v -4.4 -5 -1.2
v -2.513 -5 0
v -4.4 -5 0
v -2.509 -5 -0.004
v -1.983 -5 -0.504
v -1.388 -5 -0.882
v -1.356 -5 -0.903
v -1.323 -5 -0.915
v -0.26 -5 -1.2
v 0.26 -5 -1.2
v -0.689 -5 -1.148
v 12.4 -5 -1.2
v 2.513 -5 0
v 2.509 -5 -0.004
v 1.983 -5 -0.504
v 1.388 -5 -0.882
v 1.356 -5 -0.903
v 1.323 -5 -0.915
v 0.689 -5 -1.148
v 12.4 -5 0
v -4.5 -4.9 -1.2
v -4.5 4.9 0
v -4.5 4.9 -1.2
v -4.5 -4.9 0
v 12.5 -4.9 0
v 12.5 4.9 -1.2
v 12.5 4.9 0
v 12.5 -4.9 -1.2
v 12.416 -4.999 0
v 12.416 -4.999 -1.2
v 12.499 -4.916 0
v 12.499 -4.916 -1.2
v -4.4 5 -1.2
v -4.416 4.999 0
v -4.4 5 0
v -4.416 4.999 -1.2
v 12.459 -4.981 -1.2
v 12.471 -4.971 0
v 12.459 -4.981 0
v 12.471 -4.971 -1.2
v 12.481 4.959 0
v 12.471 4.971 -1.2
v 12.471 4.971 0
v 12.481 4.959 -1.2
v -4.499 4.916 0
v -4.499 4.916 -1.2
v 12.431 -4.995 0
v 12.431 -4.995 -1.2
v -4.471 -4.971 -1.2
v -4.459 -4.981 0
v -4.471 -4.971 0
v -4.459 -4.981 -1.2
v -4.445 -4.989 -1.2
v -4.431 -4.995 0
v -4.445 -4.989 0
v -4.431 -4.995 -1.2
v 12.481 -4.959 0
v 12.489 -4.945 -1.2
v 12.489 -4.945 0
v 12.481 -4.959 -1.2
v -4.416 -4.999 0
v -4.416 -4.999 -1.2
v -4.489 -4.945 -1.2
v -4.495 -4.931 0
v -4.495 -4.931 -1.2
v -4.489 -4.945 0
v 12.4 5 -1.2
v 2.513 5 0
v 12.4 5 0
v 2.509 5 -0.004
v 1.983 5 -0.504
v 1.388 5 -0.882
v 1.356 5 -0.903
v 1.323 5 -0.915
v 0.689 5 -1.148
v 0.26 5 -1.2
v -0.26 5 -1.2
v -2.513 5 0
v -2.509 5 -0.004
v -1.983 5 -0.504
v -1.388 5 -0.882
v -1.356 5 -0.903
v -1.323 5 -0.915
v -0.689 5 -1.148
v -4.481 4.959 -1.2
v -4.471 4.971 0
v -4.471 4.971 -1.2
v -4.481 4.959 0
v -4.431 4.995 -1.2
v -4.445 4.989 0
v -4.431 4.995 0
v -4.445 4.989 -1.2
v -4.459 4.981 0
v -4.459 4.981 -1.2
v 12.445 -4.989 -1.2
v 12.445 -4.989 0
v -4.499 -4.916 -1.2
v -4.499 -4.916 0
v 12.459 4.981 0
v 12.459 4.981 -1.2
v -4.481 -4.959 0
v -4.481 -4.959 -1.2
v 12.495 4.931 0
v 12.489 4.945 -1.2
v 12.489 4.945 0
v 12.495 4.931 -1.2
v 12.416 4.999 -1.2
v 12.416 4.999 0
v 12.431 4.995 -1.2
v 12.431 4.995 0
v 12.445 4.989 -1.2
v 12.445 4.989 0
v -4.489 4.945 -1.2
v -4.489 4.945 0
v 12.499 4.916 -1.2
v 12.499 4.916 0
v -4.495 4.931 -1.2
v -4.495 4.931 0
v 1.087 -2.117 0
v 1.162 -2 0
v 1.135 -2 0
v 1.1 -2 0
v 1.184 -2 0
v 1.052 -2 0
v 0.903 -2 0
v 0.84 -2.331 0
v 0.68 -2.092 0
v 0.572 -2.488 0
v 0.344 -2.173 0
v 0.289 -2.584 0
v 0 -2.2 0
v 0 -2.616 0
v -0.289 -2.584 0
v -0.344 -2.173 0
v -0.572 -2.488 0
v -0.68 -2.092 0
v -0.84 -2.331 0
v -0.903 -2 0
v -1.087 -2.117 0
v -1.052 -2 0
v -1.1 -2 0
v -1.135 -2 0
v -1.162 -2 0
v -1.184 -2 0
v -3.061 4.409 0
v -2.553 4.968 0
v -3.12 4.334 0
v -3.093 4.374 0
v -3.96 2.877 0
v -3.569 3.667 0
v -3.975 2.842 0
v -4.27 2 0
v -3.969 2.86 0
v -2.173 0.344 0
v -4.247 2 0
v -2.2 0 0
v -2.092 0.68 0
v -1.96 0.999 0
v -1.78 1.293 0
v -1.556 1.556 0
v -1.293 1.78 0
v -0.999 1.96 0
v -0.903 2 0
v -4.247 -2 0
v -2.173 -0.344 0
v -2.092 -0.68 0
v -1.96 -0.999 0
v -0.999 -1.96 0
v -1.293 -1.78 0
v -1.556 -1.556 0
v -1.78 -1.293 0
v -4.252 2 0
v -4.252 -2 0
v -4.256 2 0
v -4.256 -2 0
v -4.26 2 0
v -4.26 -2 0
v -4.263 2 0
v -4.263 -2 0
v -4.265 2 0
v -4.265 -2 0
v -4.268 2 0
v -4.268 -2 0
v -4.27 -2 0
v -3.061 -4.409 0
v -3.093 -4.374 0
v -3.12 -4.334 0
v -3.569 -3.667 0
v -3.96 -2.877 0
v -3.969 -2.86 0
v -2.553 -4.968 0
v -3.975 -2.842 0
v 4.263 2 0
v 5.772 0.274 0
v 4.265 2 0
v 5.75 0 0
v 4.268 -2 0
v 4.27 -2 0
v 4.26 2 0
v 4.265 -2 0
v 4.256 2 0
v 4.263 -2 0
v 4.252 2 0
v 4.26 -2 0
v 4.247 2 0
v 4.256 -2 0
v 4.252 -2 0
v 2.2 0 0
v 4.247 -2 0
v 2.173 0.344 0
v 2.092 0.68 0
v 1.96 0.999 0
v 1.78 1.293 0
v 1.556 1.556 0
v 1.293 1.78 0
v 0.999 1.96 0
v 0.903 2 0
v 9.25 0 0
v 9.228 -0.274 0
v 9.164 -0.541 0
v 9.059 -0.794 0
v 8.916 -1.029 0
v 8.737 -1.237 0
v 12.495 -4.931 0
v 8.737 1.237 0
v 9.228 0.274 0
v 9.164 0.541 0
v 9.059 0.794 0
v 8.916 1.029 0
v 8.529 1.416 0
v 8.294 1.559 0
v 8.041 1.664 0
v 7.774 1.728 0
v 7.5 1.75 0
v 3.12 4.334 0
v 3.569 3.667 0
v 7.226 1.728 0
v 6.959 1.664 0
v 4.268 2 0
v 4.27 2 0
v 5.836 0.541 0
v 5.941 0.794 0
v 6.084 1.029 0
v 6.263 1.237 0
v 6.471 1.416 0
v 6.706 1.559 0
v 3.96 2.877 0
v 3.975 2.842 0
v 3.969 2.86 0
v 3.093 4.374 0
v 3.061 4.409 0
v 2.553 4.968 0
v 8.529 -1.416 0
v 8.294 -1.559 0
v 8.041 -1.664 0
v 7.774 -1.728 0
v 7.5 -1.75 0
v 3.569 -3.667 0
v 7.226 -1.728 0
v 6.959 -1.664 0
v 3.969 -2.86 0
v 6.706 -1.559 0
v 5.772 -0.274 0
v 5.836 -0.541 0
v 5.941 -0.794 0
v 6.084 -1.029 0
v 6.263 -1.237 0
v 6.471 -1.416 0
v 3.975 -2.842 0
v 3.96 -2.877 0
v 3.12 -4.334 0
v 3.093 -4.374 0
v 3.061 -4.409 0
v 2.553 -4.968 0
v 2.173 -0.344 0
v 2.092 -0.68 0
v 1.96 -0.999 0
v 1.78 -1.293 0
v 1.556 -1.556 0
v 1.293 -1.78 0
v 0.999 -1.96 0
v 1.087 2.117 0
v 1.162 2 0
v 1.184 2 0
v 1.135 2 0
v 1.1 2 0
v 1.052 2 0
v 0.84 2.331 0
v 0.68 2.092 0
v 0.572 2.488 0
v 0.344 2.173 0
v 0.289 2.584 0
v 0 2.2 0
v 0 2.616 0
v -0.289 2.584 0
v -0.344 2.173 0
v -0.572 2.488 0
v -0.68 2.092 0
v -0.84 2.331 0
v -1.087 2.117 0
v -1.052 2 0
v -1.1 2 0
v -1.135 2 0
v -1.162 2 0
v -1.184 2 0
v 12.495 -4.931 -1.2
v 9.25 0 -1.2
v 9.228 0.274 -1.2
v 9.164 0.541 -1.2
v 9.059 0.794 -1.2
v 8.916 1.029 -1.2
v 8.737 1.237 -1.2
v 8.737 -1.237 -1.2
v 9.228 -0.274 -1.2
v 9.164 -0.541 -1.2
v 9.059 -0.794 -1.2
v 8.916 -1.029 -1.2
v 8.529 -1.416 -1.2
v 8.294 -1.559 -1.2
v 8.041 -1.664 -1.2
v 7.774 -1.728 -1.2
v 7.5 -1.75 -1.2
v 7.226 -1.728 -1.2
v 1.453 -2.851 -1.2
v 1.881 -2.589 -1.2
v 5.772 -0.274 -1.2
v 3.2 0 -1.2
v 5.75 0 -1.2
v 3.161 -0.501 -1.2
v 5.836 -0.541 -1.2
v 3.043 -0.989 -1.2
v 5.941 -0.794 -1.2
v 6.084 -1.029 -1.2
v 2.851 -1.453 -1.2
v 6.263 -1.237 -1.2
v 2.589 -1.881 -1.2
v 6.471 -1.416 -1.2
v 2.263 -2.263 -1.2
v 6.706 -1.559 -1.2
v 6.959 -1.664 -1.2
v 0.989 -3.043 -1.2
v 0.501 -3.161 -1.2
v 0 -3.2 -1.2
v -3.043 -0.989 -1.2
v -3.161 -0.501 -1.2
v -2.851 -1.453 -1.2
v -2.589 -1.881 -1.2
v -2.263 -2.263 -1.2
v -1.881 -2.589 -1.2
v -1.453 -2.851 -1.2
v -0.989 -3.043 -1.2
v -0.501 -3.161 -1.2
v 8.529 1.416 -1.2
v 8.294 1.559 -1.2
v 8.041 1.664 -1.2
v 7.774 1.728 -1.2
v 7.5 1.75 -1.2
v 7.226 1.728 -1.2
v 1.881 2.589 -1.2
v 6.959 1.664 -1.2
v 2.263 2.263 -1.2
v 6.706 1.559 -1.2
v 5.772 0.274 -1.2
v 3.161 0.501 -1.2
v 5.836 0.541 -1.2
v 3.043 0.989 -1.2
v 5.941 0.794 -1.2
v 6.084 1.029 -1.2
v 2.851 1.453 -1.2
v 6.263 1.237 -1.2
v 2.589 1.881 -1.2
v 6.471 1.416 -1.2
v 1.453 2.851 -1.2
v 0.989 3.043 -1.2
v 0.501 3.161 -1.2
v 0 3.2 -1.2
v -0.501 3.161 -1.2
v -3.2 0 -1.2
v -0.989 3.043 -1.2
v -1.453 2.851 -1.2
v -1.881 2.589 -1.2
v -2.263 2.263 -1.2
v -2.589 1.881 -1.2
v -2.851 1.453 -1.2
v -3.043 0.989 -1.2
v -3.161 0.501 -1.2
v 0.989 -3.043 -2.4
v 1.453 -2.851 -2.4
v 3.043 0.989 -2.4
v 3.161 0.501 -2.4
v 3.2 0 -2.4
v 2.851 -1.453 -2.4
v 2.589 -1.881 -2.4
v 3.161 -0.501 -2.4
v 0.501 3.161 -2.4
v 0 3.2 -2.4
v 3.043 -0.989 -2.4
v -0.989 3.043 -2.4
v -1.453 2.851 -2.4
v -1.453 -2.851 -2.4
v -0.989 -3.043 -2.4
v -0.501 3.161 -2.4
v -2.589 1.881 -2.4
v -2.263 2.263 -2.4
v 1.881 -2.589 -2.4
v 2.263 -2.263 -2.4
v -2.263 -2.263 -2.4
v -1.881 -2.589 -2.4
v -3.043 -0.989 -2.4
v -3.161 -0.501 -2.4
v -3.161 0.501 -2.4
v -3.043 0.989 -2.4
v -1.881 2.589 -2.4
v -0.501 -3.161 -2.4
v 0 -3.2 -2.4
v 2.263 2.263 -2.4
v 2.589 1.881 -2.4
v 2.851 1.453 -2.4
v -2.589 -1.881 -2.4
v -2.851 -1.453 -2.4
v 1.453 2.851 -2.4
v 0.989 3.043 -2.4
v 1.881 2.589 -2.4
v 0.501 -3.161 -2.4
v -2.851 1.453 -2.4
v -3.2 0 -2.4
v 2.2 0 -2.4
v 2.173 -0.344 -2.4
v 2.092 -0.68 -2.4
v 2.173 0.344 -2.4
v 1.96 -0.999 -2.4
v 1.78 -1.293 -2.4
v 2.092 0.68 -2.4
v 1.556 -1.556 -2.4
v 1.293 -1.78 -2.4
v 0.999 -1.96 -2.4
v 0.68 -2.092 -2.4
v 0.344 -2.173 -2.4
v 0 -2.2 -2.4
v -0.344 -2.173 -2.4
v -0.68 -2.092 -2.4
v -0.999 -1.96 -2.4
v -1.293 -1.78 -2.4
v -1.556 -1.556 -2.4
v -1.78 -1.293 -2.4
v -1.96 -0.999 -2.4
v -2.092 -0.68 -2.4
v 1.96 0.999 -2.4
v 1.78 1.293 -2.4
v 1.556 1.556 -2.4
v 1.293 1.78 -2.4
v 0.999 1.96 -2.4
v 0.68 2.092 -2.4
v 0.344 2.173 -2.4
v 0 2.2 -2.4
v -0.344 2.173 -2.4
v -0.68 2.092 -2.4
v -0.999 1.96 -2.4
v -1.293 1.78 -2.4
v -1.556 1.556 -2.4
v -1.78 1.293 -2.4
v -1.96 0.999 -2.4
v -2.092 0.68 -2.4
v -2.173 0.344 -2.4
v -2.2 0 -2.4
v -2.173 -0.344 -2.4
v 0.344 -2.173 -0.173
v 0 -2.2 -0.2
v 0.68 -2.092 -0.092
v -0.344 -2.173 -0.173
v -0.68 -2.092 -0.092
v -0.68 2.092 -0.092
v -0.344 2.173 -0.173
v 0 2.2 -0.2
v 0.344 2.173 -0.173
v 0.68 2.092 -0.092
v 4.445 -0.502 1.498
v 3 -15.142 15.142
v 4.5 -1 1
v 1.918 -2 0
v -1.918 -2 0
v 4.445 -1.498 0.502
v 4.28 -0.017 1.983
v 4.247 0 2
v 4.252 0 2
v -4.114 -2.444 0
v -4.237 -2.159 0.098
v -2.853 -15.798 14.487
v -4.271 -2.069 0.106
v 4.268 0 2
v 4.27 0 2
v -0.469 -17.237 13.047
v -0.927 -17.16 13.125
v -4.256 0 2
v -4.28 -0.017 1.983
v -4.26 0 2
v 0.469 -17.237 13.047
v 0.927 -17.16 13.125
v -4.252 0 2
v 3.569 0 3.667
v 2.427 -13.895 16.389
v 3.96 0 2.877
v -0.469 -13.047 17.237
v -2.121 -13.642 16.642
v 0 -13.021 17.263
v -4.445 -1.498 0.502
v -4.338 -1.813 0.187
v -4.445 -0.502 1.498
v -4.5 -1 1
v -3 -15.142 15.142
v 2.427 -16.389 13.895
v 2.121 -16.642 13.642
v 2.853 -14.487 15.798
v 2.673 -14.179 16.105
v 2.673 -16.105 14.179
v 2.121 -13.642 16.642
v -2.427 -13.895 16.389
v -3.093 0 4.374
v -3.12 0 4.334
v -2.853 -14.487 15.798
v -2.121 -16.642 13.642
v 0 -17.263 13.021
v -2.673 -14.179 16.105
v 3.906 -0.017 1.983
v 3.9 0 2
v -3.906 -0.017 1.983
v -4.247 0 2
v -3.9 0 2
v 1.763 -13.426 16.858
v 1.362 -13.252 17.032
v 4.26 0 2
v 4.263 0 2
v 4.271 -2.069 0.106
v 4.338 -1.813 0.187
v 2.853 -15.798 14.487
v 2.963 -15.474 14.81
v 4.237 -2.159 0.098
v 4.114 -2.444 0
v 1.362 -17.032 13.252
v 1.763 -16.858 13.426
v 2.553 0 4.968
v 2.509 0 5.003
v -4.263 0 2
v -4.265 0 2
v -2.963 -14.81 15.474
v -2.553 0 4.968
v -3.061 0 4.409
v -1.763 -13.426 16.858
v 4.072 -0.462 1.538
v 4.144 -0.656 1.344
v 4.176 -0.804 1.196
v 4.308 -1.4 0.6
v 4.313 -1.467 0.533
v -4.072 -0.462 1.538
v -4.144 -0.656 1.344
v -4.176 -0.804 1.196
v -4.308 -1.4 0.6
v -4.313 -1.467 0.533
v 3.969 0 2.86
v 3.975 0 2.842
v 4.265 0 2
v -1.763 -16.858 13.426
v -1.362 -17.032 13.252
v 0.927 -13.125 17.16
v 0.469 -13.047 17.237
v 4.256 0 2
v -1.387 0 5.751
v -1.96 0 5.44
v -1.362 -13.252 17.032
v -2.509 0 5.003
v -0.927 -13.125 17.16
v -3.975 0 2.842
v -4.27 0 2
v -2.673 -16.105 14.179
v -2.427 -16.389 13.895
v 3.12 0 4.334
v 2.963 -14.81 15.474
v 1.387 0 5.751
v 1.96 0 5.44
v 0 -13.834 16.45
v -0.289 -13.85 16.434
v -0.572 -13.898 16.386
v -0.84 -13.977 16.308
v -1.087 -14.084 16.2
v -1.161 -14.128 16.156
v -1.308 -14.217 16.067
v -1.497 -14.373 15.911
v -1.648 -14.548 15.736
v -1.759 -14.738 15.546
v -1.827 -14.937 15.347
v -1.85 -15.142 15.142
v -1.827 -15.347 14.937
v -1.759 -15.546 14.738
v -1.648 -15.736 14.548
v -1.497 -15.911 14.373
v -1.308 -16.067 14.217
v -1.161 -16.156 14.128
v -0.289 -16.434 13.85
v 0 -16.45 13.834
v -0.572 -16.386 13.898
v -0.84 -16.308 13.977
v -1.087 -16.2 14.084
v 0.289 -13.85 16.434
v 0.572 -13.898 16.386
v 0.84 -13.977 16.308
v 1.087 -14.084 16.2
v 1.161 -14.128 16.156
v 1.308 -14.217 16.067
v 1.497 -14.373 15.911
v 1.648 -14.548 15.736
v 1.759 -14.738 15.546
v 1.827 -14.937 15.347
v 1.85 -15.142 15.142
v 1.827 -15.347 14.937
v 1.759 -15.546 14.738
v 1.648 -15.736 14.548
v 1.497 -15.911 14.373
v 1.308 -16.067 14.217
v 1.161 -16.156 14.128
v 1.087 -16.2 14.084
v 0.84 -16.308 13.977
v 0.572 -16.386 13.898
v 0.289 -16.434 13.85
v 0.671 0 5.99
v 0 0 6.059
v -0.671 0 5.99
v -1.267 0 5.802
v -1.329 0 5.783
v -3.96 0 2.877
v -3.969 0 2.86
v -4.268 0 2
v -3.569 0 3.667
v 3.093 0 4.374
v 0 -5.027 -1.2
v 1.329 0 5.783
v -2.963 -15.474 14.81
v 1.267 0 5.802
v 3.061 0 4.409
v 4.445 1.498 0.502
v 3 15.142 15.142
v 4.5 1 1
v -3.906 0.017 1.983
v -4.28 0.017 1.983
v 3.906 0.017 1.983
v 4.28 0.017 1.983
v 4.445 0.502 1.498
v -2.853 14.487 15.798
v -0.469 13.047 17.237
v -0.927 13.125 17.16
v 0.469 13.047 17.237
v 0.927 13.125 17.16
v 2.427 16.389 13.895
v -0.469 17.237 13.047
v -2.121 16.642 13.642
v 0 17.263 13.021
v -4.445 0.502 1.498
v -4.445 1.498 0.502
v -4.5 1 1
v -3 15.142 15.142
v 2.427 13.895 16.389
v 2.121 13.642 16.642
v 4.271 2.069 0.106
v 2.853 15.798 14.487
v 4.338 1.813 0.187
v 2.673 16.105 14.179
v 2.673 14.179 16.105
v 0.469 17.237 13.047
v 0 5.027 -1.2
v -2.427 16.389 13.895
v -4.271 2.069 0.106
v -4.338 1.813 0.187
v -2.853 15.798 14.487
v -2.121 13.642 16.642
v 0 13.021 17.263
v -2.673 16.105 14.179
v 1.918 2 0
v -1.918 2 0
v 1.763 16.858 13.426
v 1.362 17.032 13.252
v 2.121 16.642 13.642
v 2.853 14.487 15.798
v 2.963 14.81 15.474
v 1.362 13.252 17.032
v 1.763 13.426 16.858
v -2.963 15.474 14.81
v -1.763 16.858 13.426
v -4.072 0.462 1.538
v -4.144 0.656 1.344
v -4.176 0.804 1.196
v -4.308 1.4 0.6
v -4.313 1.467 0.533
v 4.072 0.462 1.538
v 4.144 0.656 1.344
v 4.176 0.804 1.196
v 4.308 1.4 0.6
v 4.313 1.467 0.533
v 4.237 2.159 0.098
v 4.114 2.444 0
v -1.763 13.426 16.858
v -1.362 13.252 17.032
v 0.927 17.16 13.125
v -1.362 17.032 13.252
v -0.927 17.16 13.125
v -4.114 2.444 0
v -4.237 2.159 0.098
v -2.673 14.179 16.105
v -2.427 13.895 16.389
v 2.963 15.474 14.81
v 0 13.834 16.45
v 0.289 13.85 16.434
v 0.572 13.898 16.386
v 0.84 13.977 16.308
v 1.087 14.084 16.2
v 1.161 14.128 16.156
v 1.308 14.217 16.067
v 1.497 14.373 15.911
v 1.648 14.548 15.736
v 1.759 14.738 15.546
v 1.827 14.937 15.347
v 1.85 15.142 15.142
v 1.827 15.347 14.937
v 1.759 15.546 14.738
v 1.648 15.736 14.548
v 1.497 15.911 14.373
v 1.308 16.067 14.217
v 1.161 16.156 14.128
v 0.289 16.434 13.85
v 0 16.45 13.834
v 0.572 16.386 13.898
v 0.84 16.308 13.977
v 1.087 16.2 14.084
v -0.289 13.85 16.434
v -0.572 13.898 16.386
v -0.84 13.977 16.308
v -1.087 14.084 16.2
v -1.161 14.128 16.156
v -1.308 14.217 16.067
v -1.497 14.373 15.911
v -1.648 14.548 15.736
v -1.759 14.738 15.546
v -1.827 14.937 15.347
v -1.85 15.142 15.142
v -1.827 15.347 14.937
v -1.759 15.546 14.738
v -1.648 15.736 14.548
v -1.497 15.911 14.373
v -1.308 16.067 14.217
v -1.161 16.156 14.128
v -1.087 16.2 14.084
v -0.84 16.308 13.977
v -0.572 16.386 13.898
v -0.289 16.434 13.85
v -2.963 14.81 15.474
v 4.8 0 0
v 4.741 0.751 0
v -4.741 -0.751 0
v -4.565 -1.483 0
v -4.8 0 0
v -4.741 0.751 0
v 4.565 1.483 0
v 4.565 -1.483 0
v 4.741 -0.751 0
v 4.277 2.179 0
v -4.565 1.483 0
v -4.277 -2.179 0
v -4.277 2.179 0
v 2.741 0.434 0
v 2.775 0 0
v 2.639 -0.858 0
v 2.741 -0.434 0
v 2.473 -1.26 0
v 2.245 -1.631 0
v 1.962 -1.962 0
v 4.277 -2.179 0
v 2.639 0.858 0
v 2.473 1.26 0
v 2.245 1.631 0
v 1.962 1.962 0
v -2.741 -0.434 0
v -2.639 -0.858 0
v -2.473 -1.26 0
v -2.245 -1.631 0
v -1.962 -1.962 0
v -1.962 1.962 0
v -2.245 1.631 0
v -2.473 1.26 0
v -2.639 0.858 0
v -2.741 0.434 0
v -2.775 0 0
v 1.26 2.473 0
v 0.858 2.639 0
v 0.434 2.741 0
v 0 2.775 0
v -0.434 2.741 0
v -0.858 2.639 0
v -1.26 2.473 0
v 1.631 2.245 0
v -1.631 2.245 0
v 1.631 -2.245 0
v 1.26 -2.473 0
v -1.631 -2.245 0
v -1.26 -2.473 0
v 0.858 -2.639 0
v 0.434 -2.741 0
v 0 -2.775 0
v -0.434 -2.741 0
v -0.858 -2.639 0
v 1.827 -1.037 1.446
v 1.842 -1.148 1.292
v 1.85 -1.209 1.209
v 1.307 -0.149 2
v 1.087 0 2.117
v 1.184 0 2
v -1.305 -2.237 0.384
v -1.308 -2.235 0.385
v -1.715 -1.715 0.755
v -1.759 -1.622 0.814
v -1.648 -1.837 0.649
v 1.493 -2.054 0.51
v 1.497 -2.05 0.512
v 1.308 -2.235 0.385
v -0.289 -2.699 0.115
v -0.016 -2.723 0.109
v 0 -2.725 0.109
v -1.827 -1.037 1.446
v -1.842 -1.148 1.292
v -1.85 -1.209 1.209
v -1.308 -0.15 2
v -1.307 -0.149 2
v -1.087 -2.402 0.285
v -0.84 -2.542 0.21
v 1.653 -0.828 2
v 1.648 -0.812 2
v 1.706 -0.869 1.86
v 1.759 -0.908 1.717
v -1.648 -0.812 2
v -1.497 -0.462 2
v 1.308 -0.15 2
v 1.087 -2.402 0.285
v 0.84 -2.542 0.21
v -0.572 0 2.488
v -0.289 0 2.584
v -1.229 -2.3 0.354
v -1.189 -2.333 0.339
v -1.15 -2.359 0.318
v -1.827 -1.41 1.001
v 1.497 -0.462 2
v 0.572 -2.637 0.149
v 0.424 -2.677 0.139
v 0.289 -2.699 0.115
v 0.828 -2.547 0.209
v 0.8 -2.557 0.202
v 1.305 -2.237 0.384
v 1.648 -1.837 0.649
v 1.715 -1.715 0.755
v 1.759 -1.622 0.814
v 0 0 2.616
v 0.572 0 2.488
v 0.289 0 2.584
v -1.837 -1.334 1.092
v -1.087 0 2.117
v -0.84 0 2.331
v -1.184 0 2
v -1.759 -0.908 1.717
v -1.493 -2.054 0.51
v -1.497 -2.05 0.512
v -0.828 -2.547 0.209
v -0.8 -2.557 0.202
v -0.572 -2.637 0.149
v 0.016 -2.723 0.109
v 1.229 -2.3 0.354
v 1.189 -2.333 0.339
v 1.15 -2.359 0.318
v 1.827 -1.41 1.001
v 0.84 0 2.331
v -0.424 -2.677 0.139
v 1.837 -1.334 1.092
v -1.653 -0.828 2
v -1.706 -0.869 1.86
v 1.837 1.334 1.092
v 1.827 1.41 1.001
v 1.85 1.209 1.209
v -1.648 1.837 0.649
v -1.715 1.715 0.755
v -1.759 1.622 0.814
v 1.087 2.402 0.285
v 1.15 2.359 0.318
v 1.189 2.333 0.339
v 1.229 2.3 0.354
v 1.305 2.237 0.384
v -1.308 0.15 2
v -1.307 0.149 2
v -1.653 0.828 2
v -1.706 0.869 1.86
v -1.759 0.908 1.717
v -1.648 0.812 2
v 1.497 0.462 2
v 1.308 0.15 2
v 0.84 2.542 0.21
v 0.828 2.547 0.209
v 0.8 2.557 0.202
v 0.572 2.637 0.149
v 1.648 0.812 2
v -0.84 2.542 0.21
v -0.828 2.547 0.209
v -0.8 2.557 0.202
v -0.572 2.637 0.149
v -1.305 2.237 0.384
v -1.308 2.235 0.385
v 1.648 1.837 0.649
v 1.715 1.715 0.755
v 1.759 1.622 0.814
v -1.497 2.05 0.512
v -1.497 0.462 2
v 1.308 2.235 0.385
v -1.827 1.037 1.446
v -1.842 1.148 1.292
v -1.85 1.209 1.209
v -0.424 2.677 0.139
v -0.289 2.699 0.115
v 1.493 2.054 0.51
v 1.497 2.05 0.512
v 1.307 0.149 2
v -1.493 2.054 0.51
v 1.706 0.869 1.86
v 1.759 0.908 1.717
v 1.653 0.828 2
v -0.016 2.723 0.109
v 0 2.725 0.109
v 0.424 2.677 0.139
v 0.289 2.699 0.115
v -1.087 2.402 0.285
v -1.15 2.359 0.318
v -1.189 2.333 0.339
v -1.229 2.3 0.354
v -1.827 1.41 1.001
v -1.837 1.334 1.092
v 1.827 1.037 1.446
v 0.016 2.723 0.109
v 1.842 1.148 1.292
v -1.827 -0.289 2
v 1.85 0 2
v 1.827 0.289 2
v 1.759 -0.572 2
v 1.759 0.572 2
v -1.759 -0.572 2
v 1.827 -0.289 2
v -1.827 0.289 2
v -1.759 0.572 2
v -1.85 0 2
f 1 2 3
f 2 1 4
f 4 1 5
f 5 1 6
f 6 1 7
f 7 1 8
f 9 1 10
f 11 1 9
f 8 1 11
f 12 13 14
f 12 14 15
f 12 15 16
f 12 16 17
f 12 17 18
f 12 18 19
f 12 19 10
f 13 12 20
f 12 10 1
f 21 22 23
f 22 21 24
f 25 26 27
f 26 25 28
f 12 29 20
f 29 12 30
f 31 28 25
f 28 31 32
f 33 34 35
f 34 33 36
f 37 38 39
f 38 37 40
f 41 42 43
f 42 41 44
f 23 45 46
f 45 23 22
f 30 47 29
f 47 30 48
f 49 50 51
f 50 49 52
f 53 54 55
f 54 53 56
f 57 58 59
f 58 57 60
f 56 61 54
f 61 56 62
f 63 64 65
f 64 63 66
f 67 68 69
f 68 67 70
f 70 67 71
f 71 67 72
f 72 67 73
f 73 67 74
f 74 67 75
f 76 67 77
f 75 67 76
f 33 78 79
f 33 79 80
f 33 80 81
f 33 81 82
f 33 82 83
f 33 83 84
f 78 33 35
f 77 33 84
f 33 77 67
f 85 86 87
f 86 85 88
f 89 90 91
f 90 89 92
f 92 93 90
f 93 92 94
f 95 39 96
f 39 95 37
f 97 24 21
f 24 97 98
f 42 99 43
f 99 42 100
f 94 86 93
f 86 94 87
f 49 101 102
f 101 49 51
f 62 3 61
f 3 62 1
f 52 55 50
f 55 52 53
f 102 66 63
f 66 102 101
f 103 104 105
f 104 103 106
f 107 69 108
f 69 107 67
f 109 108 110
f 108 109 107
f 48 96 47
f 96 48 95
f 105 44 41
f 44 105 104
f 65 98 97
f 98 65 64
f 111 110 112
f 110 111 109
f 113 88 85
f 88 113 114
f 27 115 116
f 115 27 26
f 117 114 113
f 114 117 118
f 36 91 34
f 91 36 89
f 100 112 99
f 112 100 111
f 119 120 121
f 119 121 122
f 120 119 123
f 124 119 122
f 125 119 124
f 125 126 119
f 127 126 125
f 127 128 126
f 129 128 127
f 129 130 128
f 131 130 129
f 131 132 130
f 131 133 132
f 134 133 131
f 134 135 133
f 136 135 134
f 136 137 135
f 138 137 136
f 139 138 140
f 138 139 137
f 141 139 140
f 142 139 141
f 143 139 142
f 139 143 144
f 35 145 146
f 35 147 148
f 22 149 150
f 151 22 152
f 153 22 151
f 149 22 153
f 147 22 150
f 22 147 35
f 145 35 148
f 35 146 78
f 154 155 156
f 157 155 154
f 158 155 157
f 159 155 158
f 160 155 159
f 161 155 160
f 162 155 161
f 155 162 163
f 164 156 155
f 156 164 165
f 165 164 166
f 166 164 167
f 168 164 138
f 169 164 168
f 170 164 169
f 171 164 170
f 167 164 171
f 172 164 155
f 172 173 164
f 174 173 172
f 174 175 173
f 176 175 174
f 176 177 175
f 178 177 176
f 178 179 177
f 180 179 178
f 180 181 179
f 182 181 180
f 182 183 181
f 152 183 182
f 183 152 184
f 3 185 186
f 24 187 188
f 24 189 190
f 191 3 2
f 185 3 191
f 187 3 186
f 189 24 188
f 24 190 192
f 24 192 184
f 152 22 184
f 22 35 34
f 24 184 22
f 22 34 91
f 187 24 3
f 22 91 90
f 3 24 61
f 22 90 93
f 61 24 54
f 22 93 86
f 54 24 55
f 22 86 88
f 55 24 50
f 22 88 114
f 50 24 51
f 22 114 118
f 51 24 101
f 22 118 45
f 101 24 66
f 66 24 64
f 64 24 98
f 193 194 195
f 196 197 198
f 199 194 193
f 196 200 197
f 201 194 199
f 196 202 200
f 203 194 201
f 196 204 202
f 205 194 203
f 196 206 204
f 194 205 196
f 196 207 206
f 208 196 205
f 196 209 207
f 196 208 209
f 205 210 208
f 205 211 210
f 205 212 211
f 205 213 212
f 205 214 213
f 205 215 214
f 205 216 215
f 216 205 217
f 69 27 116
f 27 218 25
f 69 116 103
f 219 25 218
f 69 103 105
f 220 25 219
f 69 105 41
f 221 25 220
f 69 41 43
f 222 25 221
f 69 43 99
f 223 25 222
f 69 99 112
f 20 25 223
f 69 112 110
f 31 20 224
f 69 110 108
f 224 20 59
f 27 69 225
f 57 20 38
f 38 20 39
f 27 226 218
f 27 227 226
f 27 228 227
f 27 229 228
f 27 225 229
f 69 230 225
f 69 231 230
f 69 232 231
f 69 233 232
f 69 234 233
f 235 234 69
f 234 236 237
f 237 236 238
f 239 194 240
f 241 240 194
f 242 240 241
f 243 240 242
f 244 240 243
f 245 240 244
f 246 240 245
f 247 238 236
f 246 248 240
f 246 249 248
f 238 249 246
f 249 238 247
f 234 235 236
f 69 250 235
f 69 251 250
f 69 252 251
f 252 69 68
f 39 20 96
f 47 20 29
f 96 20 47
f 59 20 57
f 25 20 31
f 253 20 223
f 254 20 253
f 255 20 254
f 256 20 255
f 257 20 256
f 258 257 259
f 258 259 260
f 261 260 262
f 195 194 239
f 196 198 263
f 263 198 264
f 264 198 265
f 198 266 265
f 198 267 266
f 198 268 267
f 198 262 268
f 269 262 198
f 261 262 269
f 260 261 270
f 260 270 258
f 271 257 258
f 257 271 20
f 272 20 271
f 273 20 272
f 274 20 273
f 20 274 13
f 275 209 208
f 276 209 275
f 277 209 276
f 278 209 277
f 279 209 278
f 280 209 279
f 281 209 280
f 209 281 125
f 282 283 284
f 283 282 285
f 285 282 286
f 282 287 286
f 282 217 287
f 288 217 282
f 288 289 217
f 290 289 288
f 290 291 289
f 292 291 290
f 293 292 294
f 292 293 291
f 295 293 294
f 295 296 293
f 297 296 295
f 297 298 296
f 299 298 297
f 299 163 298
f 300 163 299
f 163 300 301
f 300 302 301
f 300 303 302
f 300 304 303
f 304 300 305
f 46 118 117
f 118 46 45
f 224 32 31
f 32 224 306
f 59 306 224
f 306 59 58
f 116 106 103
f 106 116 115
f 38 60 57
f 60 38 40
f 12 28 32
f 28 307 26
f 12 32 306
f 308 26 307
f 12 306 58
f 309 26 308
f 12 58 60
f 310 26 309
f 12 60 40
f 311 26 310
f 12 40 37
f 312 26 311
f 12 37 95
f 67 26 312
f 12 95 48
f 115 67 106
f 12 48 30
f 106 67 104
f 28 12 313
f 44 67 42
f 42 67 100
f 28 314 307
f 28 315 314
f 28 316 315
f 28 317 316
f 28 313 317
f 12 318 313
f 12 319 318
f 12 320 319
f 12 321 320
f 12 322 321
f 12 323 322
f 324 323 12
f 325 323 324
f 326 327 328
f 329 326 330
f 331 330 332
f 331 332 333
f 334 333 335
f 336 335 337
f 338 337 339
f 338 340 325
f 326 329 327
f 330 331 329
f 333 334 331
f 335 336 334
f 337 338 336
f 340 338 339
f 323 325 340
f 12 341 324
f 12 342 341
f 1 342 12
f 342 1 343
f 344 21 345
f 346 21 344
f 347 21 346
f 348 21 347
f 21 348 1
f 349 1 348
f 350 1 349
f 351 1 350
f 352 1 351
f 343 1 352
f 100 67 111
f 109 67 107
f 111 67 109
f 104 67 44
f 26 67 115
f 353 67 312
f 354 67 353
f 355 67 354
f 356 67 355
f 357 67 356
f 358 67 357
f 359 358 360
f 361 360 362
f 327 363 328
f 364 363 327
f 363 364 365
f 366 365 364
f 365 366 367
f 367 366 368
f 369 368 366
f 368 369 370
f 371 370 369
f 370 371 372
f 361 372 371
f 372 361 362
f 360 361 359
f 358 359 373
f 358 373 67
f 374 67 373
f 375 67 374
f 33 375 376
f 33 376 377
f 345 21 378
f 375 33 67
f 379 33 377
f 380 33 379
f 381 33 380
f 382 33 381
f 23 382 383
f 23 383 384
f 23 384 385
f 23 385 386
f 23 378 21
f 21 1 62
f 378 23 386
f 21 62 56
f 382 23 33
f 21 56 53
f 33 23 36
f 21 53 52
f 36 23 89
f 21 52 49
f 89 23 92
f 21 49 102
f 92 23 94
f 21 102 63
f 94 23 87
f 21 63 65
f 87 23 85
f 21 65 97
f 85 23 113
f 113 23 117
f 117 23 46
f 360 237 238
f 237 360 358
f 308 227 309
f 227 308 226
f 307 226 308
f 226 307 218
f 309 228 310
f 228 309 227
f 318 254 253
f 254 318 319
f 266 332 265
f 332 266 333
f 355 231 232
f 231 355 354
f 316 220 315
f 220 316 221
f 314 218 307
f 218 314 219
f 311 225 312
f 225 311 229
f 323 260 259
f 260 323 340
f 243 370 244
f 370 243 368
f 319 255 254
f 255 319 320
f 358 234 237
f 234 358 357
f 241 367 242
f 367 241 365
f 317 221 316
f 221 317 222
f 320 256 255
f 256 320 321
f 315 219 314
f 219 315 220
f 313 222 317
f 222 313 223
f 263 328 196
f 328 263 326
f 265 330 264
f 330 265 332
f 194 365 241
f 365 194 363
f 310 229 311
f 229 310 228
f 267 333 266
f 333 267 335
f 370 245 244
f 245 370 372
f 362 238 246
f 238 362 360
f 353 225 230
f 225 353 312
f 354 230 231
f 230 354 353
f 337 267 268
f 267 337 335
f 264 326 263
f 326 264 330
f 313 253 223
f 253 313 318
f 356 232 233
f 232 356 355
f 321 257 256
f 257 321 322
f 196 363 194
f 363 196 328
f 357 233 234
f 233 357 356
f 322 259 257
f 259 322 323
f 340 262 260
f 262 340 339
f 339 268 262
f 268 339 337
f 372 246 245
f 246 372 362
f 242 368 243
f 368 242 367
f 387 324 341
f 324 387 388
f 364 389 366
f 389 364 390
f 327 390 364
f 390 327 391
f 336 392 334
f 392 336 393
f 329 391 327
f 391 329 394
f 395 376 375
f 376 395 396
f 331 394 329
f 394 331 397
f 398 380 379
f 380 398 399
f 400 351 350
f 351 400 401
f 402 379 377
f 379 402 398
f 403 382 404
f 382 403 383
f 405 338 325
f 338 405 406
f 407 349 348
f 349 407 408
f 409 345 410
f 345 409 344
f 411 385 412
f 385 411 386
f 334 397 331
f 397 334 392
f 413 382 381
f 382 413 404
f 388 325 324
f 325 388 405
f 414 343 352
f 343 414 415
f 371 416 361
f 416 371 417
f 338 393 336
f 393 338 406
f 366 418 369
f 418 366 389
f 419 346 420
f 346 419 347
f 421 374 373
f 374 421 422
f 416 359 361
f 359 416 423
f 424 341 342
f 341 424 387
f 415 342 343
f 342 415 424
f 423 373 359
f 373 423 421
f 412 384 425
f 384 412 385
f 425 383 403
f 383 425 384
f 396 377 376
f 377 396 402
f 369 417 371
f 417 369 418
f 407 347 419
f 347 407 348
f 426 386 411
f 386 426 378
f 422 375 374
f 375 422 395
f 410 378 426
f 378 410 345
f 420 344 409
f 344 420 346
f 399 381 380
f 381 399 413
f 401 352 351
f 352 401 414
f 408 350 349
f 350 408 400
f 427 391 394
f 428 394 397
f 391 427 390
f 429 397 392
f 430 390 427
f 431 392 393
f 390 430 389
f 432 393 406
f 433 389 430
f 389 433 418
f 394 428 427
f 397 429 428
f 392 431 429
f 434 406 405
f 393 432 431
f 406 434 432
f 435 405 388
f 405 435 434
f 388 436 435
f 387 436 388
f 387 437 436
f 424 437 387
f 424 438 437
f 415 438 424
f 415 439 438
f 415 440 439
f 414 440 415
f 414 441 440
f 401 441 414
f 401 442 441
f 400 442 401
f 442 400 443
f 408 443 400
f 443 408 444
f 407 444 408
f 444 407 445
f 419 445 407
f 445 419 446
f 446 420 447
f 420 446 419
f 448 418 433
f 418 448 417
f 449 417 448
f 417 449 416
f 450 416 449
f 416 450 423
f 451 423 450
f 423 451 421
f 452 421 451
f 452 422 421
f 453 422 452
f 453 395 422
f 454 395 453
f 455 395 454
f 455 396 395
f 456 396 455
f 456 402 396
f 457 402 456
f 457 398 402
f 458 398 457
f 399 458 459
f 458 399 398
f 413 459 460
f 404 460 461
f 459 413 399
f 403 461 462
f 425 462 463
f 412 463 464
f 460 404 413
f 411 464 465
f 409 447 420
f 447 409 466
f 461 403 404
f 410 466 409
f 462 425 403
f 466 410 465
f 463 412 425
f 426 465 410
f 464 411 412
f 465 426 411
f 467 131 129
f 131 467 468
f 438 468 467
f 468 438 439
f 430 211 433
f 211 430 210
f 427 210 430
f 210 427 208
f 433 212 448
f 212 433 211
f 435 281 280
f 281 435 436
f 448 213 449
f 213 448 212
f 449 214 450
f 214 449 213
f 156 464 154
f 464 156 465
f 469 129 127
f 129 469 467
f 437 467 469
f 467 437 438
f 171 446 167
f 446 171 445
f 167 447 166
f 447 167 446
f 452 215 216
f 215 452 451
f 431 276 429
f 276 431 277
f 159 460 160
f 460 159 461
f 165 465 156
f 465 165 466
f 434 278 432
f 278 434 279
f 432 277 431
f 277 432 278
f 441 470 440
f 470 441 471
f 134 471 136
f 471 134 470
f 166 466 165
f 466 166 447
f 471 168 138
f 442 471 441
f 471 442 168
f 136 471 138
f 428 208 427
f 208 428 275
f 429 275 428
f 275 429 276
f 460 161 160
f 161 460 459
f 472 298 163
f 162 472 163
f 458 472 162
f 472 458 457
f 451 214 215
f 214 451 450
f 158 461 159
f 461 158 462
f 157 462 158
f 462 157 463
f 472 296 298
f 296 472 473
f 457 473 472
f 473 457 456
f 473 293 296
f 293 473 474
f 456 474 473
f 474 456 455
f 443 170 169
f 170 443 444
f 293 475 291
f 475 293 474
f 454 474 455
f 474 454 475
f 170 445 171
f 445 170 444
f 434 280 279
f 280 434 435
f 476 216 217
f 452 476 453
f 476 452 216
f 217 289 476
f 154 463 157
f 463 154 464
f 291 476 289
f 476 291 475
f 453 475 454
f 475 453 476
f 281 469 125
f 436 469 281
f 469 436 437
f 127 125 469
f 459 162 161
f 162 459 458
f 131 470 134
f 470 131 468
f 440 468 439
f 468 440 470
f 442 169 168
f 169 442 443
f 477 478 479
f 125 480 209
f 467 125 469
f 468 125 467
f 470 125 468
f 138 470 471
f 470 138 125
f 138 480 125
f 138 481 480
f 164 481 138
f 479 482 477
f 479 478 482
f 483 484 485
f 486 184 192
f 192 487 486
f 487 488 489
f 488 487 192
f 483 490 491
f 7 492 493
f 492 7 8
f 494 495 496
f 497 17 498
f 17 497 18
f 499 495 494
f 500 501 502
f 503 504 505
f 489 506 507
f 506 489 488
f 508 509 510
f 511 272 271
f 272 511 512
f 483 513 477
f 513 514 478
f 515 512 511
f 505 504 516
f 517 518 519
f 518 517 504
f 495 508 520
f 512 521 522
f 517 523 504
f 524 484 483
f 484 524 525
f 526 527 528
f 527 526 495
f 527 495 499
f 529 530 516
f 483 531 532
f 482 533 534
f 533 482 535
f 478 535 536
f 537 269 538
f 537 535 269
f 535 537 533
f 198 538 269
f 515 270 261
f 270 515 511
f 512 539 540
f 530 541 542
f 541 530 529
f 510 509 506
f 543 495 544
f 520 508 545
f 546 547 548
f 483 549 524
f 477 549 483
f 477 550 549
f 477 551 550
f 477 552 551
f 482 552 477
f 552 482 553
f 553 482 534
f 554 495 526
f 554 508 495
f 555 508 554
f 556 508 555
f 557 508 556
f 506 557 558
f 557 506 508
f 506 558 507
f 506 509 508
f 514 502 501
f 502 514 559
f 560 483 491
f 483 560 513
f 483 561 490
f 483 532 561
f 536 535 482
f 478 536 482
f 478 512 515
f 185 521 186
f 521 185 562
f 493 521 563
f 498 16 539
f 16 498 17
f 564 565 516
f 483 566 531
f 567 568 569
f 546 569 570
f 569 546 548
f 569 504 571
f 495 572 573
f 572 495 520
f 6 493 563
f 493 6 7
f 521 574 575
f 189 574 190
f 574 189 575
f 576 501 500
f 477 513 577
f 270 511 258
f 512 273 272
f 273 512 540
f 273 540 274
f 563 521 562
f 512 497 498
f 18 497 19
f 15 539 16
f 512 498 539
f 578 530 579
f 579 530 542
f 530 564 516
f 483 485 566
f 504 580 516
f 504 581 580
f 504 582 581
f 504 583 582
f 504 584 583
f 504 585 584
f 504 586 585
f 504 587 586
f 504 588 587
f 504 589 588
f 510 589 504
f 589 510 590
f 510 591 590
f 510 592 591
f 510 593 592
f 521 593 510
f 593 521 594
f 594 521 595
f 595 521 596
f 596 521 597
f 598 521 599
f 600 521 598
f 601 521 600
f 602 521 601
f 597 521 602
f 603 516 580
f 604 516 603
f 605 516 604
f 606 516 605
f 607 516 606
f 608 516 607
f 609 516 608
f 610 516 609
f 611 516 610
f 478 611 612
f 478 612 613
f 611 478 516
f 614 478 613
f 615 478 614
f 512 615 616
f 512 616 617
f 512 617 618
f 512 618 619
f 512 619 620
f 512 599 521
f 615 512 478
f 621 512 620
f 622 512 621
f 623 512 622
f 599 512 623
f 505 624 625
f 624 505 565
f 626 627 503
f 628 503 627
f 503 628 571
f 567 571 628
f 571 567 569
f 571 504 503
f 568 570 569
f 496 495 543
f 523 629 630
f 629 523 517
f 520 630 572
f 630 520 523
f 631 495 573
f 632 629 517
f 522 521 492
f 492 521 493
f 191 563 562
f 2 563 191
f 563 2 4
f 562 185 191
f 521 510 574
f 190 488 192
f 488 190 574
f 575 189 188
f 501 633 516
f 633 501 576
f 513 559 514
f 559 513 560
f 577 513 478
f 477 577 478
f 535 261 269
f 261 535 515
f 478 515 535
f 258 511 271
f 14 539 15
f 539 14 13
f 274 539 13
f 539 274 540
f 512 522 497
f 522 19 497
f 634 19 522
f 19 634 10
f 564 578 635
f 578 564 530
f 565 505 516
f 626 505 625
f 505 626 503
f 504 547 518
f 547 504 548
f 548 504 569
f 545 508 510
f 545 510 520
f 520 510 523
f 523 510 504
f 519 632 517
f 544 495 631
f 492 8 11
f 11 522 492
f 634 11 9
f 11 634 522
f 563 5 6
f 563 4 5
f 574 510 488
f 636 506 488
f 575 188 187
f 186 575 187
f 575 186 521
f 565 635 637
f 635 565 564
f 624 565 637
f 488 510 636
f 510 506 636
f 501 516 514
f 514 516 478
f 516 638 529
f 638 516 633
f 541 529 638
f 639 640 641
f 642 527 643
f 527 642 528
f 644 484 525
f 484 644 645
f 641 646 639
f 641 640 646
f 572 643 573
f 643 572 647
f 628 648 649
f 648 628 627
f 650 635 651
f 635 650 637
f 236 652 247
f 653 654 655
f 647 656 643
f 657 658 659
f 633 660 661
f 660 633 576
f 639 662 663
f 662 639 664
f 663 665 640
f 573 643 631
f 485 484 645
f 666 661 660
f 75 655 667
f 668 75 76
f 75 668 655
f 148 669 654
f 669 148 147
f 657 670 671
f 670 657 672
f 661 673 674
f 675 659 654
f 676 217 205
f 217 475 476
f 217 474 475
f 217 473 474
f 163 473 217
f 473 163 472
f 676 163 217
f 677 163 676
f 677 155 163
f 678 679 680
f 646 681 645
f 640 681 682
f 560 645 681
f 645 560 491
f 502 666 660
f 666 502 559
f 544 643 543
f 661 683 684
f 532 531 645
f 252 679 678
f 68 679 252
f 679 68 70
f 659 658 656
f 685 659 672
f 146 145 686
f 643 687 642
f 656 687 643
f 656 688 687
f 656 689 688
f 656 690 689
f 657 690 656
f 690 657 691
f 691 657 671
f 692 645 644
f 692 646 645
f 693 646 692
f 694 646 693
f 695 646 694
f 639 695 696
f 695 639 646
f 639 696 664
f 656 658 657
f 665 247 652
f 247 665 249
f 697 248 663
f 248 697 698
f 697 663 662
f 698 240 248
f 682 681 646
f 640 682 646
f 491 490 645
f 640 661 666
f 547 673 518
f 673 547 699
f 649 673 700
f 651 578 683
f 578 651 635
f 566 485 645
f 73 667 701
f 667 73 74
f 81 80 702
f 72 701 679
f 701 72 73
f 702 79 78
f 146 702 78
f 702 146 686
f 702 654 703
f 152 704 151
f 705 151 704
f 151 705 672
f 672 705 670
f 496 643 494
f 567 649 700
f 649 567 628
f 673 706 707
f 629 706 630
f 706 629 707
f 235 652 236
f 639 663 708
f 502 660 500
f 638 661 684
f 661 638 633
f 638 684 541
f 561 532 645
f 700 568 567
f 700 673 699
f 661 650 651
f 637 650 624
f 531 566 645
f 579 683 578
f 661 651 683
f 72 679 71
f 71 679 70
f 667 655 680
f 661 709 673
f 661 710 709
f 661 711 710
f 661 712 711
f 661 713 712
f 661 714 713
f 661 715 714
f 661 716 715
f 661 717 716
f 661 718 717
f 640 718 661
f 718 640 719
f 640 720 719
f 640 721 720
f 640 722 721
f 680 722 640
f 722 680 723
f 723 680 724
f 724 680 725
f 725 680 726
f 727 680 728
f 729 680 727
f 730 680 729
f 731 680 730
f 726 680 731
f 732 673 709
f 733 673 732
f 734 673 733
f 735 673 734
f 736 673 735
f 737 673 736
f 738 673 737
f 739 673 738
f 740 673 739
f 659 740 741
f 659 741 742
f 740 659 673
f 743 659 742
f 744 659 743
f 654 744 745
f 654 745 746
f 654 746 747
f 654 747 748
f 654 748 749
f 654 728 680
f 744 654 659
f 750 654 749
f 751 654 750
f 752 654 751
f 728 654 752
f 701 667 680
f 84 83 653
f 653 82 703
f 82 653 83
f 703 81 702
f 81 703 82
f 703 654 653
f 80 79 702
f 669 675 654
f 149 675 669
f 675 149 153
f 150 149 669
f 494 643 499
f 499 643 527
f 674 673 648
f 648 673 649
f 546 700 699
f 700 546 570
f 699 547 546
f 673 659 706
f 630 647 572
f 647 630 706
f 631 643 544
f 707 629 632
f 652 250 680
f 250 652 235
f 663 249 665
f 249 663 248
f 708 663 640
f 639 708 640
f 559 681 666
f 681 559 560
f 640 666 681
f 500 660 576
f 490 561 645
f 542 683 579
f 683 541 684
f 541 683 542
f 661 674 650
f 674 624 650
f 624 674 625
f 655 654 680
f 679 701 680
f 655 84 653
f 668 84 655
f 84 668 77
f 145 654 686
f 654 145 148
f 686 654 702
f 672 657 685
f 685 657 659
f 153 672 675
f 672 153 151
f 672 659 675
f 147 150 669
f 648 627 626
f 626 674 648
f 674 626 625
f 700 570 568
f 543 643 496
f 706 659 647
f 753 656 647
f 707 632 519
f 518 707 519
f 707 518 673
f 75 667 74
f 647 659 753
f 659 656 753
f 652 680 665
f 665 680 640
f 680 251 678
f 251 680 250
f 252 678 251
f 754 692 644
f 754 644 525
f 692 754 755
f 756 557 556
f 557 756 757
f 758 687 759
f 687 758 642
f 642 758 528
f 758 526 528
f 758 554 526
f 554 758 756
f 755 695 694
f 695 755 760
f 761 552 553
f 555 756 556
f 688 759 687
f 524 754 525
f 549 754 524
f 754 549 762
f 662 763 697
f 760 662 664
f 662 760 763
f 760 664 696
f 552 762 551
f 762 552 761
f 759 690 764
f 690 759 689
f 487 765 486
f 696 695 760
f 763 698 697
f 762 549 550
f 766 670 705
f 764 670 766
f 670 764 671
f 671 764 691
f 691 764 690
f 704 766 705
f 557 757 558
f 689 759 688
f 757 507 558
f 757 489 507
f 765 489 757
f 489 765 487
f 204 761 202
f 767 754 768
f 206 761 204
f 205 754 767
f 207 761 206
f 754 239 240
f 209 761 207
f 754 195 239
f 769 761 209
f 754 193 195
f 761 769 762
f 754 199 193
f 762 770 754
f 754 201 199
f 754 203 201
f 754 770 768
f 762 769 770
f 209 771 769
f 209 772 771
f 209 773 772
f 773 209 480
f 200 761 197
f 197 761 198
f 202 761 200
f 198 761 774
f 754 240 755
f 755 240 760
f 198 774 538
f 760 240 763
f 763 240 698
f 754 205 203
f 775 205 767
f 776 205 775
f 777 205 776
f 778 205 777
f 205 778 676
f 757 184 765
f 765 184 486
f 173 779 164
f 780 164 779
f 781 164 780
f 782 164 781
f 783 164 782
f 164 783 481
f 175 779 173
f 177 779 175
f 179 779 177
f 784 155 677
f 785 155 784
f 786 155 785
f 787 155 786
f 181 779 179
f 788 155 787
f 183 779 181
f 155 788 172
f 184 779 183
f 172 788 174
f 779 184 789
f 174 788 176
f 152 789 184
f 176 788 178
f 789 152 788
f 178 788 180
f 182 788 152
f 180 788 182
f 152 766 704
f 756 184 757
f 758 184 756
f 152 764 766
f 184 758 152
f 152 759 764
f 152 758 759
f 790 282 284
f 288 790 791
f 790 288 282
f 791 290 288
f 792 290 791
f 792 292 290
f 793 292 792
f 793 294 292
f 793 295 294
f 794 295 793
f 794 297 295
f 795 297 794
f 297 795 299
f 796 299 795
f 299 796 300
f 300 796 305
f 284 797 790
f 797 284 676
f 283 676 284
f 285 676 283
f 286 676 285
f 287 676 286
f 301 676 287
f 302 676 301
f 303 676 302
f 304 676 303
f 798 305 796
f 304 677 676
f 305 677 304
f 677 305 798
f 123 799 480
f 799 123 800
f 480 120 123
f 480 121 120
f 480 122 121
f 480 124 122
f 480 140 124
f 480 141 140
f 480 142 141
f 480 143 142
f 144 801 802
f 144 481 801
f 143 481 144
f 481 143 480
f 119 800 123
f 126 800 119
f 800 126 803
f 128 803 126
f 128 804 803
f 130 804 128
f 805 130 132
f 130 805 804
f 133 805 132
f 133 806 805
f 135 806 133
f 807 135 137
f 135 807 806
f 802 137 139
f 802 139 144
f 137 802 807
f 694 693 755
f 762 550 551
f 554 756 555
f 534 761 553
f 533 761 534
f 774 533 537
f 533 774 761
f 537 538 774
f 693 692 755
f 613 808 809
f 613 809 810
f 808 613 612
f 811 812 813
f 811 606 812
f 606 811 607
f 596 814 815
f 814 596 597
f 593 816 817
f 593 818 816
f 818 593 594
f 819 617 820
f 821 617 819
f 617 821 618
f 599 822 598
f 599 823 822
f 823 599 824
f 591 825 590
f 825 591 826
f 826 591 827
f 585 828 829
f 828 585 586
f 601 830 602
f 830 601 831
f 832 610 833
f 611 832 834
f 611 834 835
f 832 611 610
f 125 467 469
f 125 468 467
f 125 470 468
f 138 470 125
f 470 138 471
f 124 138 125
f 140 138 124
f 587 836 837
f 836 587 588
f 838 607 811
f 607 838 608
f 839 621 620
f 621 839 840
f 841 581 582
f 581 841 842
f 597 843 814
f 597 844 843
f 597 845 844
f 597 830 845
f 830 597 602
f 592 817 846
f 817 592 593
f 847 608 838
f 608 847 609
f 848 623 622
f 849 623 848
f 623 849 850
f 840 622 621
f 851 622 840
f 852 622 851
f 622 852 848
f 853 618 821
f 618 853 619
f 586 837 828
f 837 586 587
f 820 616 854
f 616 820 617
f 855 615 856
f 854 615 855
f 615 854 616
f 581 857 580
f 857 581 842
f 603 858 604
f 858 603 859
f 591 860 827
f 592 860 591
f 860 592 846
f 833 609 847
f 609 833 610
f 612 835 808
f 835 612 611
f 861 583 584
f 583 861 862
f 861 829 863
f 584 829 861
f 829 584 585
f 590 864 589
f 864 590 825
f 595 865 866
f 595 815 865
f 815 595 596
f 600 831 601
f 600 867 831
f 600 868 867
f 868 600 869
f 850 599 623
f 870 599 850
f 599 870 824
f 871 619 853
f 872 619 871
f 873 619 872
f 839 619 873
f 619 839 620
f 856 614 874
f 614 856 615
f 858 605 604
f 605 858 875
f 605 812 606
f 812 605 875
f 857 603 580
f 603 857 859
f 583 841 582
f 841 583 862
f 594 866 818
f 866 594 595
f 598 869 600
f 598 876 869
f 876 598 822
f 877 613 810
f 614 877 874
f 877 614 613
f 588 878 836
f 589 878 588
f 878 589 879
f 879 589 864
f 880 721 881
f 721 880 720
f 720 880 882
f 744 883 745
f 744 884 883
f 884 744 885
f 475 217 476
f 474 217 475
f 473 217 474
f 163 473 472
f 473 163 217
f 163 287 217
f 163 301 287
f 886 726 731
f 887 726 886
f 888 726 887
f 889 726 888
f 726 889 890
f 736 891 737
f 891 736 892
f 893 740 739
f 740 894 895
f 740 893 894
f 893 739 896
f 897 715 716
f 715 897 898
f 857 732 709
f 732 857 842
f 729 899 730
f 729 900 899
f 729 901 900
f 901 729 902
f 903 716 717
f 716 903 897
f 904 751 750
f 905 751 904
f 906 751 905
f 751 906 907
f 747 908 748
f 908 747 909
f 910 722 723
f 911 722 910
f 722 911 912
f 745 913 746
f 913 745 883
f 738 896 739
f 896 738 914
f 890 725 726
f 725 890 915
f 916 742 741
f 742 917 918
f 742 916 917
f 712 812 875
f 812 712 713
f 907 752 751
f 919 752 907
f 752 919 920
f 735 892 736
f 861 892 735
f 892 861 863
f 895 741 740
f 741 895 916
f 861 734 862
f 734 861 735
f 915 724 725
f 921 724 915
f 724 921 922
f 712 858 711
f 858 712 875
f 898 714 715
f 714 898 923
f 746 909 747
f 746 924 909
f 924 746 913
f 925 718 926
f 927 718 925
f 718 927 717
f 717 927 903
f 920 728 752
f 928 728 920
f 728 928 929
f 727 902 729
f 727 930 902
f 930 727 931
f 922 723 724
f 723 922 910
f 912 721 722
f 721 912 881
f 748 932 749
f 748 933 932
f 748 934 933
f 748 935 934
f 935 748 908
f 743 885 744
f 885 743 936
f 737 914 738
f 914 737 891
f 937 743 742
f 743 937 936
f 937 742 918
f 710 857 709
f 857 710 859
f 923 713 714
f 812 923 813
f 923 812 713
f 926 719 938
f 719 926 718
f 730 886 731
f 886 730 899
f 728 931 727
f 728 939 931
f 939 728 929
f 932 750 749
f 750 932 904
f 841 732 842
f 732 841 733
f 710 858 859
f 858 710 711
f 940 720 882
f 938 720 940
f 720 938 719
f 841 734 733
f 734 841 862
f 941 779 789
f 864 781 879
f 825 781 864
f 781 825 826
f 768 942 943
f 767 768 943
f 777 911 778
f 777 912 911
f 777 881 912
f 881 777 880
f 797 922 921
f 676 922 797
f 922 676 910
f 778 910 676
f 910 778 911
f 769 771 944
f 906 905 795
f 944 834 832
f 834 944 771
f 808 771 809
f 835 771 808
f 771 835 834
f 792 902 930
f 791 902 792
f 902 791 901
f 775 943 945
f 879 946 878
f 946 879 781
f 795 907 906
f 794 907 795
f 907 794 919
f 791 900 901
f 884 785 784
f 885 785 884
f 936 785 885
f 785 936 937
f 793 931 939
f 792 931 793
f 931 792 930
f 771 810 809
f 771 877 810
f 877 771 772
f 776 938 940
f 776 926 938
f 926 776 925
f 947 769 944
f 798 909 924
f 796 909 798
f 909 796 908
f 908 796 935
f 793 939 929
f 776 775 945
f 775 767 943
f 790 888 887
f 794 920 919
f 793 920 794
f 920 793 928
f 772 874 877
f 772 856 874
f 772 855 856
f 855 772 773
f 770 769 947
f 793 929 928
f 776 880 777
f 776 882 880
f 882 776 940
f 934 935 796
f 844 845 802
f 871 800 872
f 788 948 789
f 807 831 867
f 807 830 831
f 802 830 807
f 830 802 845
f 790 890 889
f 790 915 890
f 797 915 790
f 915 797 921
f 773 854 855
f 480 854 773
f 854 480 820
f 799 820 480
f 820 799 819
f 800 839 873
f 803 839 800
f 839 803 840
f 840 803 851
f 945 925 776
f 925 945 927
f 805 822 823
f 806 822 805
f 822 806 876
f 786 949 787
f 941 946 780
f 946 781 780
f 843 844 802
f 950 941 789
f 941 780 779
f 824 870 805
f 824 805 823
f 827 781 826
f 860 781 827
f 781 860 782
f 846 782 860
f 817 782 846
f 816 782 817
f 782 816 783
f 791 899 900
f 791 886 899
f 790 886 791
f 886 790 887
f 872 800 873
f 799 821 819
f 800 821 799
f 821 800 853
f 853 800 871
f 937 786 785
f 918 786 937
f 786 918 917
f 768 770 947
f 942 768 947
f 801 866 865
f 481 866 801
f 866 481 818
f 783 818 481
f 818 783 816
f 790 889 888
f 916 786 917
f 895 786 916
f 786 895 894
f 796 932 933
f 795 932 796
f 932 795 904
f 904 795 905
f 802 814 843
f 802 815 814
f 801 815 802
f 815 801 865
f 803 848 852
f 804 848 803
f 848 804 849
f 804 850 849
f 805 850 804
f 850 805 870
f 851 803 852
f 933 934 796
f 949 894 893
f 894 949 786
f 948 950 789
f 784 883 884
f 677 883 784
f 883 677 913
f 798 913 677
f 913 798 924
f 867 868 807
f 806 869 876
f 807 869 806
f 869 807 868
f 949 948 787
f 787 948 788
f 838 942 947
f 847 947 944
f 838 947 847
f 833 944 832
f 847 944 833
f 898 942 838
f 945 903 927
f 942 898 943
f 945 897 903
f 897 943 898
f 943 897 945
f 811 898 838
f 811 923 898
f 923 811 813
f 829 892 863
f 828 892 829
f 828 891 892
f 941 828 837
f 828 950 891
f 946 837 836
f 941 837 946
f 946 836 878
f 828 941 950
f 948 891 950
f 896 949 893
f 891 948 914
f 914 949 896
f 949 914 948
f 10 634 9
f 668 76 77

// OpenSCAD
/*
Quadrysteria QR200 Antenna Holder (c) by Jorge Monteiro

Quadrysteria QR200 Antenna Holder is licensed under a
Creative Commons Attribution-ShareAlike 4.0 International.

You should have received a copy of the license along with this
work.  If not, see <http://creativecommons.org/licenses/by-sa/4.0/>.
*/
/* [Basics] */
// Space between tips in mm
// antenna length in mm
antennaLength = 20;
// antenna outer diameter in mm
antennaOuter = 3;
// antenna inner diameter in mm
antennaInner = 1.85;
// base thickness
thickness=1.2;
// gap thickness
gapThickness=1.2;
// screw width
screwWidth=1.75;
// hole diameter
holeWidth=3.2;

/* [Ignore] */
$fn = 40*1;

drawBase();
drawHolders();

// draw the base
module drawBase() {
    translate([0,0,-(thickness+gapThickness)]){
        difference() {
            translate([4,0,gapThickness]) {
                roundedCube(17, 10, thickness, .1);
            }
            translate([7.5,0,gapThickness]) cylinder(thickness, screwWidth, screwWidth);
            cylinder((thickness+gapThickness), holeWidth, holeWidth);
        }
        difference(){
            cylinder((thickness+gapThickness), holeWidth, holeWidth);
            cylinder((thickness+gapThickness), holeWidth-1, holeWidth-1);
        }
    }
};

//draw the antenna holders
module drawHolders() {
    difference() {
        union() {
            // add the antenna holders
            translate([0,-1,1]){
                rotate([45, 0, 0]){
                    cylinder(antennaLength, antennaOuter+1.5, antennaOuter);
                }
            }
            translate([0,1,1]){
                rotate([-45, 0, 0]){
                    cylinder(antennaLength, antennaOuter+1.5, antennaOuter);
                }
            }
            cylinder(4, antennaOuter*1.6, antennaOuter);


        }
        // remove all the bottom stuff, we do not need it
        translate([0,0,-2.5-thickness]) {
            cube([100,100,5], true);
        }
        union() {
            // and all the interior spots
            translate([0,-1,1]){
                rotate([45, 0, 0]){
                    cylinder(antennaLength*1.5, antennaInner, antennaInner);
                }
            }
            translate([0,1,1]){
                rotate([-45, 0, 0]){
                    cylinder(antennaLength*1.5, antennaInner, antennaInner);
                }
            }
            cylinder(2, antennaInner*1.5, antennaInner);
        }
    };
};

module roundedCube(xdim, ydim, zdim, rdim) {
    translate([-xdim/2,-ydim/2,0]){
        hull(){
            translate([rdim,rdim,0]) cylinder(r=rdim, h=zdim);
            translate([xdim-rdim,rdim,0]) cylinder(r=rdim, h=zdim);

            translate([rdim,ydim-rdim,0]) cylinder(r=rdim, h=zdim);
            translate([xdim-rdim,ydim-rdim,0]) cylinder(r=rdim, h=zdim);

        };
    };
};
